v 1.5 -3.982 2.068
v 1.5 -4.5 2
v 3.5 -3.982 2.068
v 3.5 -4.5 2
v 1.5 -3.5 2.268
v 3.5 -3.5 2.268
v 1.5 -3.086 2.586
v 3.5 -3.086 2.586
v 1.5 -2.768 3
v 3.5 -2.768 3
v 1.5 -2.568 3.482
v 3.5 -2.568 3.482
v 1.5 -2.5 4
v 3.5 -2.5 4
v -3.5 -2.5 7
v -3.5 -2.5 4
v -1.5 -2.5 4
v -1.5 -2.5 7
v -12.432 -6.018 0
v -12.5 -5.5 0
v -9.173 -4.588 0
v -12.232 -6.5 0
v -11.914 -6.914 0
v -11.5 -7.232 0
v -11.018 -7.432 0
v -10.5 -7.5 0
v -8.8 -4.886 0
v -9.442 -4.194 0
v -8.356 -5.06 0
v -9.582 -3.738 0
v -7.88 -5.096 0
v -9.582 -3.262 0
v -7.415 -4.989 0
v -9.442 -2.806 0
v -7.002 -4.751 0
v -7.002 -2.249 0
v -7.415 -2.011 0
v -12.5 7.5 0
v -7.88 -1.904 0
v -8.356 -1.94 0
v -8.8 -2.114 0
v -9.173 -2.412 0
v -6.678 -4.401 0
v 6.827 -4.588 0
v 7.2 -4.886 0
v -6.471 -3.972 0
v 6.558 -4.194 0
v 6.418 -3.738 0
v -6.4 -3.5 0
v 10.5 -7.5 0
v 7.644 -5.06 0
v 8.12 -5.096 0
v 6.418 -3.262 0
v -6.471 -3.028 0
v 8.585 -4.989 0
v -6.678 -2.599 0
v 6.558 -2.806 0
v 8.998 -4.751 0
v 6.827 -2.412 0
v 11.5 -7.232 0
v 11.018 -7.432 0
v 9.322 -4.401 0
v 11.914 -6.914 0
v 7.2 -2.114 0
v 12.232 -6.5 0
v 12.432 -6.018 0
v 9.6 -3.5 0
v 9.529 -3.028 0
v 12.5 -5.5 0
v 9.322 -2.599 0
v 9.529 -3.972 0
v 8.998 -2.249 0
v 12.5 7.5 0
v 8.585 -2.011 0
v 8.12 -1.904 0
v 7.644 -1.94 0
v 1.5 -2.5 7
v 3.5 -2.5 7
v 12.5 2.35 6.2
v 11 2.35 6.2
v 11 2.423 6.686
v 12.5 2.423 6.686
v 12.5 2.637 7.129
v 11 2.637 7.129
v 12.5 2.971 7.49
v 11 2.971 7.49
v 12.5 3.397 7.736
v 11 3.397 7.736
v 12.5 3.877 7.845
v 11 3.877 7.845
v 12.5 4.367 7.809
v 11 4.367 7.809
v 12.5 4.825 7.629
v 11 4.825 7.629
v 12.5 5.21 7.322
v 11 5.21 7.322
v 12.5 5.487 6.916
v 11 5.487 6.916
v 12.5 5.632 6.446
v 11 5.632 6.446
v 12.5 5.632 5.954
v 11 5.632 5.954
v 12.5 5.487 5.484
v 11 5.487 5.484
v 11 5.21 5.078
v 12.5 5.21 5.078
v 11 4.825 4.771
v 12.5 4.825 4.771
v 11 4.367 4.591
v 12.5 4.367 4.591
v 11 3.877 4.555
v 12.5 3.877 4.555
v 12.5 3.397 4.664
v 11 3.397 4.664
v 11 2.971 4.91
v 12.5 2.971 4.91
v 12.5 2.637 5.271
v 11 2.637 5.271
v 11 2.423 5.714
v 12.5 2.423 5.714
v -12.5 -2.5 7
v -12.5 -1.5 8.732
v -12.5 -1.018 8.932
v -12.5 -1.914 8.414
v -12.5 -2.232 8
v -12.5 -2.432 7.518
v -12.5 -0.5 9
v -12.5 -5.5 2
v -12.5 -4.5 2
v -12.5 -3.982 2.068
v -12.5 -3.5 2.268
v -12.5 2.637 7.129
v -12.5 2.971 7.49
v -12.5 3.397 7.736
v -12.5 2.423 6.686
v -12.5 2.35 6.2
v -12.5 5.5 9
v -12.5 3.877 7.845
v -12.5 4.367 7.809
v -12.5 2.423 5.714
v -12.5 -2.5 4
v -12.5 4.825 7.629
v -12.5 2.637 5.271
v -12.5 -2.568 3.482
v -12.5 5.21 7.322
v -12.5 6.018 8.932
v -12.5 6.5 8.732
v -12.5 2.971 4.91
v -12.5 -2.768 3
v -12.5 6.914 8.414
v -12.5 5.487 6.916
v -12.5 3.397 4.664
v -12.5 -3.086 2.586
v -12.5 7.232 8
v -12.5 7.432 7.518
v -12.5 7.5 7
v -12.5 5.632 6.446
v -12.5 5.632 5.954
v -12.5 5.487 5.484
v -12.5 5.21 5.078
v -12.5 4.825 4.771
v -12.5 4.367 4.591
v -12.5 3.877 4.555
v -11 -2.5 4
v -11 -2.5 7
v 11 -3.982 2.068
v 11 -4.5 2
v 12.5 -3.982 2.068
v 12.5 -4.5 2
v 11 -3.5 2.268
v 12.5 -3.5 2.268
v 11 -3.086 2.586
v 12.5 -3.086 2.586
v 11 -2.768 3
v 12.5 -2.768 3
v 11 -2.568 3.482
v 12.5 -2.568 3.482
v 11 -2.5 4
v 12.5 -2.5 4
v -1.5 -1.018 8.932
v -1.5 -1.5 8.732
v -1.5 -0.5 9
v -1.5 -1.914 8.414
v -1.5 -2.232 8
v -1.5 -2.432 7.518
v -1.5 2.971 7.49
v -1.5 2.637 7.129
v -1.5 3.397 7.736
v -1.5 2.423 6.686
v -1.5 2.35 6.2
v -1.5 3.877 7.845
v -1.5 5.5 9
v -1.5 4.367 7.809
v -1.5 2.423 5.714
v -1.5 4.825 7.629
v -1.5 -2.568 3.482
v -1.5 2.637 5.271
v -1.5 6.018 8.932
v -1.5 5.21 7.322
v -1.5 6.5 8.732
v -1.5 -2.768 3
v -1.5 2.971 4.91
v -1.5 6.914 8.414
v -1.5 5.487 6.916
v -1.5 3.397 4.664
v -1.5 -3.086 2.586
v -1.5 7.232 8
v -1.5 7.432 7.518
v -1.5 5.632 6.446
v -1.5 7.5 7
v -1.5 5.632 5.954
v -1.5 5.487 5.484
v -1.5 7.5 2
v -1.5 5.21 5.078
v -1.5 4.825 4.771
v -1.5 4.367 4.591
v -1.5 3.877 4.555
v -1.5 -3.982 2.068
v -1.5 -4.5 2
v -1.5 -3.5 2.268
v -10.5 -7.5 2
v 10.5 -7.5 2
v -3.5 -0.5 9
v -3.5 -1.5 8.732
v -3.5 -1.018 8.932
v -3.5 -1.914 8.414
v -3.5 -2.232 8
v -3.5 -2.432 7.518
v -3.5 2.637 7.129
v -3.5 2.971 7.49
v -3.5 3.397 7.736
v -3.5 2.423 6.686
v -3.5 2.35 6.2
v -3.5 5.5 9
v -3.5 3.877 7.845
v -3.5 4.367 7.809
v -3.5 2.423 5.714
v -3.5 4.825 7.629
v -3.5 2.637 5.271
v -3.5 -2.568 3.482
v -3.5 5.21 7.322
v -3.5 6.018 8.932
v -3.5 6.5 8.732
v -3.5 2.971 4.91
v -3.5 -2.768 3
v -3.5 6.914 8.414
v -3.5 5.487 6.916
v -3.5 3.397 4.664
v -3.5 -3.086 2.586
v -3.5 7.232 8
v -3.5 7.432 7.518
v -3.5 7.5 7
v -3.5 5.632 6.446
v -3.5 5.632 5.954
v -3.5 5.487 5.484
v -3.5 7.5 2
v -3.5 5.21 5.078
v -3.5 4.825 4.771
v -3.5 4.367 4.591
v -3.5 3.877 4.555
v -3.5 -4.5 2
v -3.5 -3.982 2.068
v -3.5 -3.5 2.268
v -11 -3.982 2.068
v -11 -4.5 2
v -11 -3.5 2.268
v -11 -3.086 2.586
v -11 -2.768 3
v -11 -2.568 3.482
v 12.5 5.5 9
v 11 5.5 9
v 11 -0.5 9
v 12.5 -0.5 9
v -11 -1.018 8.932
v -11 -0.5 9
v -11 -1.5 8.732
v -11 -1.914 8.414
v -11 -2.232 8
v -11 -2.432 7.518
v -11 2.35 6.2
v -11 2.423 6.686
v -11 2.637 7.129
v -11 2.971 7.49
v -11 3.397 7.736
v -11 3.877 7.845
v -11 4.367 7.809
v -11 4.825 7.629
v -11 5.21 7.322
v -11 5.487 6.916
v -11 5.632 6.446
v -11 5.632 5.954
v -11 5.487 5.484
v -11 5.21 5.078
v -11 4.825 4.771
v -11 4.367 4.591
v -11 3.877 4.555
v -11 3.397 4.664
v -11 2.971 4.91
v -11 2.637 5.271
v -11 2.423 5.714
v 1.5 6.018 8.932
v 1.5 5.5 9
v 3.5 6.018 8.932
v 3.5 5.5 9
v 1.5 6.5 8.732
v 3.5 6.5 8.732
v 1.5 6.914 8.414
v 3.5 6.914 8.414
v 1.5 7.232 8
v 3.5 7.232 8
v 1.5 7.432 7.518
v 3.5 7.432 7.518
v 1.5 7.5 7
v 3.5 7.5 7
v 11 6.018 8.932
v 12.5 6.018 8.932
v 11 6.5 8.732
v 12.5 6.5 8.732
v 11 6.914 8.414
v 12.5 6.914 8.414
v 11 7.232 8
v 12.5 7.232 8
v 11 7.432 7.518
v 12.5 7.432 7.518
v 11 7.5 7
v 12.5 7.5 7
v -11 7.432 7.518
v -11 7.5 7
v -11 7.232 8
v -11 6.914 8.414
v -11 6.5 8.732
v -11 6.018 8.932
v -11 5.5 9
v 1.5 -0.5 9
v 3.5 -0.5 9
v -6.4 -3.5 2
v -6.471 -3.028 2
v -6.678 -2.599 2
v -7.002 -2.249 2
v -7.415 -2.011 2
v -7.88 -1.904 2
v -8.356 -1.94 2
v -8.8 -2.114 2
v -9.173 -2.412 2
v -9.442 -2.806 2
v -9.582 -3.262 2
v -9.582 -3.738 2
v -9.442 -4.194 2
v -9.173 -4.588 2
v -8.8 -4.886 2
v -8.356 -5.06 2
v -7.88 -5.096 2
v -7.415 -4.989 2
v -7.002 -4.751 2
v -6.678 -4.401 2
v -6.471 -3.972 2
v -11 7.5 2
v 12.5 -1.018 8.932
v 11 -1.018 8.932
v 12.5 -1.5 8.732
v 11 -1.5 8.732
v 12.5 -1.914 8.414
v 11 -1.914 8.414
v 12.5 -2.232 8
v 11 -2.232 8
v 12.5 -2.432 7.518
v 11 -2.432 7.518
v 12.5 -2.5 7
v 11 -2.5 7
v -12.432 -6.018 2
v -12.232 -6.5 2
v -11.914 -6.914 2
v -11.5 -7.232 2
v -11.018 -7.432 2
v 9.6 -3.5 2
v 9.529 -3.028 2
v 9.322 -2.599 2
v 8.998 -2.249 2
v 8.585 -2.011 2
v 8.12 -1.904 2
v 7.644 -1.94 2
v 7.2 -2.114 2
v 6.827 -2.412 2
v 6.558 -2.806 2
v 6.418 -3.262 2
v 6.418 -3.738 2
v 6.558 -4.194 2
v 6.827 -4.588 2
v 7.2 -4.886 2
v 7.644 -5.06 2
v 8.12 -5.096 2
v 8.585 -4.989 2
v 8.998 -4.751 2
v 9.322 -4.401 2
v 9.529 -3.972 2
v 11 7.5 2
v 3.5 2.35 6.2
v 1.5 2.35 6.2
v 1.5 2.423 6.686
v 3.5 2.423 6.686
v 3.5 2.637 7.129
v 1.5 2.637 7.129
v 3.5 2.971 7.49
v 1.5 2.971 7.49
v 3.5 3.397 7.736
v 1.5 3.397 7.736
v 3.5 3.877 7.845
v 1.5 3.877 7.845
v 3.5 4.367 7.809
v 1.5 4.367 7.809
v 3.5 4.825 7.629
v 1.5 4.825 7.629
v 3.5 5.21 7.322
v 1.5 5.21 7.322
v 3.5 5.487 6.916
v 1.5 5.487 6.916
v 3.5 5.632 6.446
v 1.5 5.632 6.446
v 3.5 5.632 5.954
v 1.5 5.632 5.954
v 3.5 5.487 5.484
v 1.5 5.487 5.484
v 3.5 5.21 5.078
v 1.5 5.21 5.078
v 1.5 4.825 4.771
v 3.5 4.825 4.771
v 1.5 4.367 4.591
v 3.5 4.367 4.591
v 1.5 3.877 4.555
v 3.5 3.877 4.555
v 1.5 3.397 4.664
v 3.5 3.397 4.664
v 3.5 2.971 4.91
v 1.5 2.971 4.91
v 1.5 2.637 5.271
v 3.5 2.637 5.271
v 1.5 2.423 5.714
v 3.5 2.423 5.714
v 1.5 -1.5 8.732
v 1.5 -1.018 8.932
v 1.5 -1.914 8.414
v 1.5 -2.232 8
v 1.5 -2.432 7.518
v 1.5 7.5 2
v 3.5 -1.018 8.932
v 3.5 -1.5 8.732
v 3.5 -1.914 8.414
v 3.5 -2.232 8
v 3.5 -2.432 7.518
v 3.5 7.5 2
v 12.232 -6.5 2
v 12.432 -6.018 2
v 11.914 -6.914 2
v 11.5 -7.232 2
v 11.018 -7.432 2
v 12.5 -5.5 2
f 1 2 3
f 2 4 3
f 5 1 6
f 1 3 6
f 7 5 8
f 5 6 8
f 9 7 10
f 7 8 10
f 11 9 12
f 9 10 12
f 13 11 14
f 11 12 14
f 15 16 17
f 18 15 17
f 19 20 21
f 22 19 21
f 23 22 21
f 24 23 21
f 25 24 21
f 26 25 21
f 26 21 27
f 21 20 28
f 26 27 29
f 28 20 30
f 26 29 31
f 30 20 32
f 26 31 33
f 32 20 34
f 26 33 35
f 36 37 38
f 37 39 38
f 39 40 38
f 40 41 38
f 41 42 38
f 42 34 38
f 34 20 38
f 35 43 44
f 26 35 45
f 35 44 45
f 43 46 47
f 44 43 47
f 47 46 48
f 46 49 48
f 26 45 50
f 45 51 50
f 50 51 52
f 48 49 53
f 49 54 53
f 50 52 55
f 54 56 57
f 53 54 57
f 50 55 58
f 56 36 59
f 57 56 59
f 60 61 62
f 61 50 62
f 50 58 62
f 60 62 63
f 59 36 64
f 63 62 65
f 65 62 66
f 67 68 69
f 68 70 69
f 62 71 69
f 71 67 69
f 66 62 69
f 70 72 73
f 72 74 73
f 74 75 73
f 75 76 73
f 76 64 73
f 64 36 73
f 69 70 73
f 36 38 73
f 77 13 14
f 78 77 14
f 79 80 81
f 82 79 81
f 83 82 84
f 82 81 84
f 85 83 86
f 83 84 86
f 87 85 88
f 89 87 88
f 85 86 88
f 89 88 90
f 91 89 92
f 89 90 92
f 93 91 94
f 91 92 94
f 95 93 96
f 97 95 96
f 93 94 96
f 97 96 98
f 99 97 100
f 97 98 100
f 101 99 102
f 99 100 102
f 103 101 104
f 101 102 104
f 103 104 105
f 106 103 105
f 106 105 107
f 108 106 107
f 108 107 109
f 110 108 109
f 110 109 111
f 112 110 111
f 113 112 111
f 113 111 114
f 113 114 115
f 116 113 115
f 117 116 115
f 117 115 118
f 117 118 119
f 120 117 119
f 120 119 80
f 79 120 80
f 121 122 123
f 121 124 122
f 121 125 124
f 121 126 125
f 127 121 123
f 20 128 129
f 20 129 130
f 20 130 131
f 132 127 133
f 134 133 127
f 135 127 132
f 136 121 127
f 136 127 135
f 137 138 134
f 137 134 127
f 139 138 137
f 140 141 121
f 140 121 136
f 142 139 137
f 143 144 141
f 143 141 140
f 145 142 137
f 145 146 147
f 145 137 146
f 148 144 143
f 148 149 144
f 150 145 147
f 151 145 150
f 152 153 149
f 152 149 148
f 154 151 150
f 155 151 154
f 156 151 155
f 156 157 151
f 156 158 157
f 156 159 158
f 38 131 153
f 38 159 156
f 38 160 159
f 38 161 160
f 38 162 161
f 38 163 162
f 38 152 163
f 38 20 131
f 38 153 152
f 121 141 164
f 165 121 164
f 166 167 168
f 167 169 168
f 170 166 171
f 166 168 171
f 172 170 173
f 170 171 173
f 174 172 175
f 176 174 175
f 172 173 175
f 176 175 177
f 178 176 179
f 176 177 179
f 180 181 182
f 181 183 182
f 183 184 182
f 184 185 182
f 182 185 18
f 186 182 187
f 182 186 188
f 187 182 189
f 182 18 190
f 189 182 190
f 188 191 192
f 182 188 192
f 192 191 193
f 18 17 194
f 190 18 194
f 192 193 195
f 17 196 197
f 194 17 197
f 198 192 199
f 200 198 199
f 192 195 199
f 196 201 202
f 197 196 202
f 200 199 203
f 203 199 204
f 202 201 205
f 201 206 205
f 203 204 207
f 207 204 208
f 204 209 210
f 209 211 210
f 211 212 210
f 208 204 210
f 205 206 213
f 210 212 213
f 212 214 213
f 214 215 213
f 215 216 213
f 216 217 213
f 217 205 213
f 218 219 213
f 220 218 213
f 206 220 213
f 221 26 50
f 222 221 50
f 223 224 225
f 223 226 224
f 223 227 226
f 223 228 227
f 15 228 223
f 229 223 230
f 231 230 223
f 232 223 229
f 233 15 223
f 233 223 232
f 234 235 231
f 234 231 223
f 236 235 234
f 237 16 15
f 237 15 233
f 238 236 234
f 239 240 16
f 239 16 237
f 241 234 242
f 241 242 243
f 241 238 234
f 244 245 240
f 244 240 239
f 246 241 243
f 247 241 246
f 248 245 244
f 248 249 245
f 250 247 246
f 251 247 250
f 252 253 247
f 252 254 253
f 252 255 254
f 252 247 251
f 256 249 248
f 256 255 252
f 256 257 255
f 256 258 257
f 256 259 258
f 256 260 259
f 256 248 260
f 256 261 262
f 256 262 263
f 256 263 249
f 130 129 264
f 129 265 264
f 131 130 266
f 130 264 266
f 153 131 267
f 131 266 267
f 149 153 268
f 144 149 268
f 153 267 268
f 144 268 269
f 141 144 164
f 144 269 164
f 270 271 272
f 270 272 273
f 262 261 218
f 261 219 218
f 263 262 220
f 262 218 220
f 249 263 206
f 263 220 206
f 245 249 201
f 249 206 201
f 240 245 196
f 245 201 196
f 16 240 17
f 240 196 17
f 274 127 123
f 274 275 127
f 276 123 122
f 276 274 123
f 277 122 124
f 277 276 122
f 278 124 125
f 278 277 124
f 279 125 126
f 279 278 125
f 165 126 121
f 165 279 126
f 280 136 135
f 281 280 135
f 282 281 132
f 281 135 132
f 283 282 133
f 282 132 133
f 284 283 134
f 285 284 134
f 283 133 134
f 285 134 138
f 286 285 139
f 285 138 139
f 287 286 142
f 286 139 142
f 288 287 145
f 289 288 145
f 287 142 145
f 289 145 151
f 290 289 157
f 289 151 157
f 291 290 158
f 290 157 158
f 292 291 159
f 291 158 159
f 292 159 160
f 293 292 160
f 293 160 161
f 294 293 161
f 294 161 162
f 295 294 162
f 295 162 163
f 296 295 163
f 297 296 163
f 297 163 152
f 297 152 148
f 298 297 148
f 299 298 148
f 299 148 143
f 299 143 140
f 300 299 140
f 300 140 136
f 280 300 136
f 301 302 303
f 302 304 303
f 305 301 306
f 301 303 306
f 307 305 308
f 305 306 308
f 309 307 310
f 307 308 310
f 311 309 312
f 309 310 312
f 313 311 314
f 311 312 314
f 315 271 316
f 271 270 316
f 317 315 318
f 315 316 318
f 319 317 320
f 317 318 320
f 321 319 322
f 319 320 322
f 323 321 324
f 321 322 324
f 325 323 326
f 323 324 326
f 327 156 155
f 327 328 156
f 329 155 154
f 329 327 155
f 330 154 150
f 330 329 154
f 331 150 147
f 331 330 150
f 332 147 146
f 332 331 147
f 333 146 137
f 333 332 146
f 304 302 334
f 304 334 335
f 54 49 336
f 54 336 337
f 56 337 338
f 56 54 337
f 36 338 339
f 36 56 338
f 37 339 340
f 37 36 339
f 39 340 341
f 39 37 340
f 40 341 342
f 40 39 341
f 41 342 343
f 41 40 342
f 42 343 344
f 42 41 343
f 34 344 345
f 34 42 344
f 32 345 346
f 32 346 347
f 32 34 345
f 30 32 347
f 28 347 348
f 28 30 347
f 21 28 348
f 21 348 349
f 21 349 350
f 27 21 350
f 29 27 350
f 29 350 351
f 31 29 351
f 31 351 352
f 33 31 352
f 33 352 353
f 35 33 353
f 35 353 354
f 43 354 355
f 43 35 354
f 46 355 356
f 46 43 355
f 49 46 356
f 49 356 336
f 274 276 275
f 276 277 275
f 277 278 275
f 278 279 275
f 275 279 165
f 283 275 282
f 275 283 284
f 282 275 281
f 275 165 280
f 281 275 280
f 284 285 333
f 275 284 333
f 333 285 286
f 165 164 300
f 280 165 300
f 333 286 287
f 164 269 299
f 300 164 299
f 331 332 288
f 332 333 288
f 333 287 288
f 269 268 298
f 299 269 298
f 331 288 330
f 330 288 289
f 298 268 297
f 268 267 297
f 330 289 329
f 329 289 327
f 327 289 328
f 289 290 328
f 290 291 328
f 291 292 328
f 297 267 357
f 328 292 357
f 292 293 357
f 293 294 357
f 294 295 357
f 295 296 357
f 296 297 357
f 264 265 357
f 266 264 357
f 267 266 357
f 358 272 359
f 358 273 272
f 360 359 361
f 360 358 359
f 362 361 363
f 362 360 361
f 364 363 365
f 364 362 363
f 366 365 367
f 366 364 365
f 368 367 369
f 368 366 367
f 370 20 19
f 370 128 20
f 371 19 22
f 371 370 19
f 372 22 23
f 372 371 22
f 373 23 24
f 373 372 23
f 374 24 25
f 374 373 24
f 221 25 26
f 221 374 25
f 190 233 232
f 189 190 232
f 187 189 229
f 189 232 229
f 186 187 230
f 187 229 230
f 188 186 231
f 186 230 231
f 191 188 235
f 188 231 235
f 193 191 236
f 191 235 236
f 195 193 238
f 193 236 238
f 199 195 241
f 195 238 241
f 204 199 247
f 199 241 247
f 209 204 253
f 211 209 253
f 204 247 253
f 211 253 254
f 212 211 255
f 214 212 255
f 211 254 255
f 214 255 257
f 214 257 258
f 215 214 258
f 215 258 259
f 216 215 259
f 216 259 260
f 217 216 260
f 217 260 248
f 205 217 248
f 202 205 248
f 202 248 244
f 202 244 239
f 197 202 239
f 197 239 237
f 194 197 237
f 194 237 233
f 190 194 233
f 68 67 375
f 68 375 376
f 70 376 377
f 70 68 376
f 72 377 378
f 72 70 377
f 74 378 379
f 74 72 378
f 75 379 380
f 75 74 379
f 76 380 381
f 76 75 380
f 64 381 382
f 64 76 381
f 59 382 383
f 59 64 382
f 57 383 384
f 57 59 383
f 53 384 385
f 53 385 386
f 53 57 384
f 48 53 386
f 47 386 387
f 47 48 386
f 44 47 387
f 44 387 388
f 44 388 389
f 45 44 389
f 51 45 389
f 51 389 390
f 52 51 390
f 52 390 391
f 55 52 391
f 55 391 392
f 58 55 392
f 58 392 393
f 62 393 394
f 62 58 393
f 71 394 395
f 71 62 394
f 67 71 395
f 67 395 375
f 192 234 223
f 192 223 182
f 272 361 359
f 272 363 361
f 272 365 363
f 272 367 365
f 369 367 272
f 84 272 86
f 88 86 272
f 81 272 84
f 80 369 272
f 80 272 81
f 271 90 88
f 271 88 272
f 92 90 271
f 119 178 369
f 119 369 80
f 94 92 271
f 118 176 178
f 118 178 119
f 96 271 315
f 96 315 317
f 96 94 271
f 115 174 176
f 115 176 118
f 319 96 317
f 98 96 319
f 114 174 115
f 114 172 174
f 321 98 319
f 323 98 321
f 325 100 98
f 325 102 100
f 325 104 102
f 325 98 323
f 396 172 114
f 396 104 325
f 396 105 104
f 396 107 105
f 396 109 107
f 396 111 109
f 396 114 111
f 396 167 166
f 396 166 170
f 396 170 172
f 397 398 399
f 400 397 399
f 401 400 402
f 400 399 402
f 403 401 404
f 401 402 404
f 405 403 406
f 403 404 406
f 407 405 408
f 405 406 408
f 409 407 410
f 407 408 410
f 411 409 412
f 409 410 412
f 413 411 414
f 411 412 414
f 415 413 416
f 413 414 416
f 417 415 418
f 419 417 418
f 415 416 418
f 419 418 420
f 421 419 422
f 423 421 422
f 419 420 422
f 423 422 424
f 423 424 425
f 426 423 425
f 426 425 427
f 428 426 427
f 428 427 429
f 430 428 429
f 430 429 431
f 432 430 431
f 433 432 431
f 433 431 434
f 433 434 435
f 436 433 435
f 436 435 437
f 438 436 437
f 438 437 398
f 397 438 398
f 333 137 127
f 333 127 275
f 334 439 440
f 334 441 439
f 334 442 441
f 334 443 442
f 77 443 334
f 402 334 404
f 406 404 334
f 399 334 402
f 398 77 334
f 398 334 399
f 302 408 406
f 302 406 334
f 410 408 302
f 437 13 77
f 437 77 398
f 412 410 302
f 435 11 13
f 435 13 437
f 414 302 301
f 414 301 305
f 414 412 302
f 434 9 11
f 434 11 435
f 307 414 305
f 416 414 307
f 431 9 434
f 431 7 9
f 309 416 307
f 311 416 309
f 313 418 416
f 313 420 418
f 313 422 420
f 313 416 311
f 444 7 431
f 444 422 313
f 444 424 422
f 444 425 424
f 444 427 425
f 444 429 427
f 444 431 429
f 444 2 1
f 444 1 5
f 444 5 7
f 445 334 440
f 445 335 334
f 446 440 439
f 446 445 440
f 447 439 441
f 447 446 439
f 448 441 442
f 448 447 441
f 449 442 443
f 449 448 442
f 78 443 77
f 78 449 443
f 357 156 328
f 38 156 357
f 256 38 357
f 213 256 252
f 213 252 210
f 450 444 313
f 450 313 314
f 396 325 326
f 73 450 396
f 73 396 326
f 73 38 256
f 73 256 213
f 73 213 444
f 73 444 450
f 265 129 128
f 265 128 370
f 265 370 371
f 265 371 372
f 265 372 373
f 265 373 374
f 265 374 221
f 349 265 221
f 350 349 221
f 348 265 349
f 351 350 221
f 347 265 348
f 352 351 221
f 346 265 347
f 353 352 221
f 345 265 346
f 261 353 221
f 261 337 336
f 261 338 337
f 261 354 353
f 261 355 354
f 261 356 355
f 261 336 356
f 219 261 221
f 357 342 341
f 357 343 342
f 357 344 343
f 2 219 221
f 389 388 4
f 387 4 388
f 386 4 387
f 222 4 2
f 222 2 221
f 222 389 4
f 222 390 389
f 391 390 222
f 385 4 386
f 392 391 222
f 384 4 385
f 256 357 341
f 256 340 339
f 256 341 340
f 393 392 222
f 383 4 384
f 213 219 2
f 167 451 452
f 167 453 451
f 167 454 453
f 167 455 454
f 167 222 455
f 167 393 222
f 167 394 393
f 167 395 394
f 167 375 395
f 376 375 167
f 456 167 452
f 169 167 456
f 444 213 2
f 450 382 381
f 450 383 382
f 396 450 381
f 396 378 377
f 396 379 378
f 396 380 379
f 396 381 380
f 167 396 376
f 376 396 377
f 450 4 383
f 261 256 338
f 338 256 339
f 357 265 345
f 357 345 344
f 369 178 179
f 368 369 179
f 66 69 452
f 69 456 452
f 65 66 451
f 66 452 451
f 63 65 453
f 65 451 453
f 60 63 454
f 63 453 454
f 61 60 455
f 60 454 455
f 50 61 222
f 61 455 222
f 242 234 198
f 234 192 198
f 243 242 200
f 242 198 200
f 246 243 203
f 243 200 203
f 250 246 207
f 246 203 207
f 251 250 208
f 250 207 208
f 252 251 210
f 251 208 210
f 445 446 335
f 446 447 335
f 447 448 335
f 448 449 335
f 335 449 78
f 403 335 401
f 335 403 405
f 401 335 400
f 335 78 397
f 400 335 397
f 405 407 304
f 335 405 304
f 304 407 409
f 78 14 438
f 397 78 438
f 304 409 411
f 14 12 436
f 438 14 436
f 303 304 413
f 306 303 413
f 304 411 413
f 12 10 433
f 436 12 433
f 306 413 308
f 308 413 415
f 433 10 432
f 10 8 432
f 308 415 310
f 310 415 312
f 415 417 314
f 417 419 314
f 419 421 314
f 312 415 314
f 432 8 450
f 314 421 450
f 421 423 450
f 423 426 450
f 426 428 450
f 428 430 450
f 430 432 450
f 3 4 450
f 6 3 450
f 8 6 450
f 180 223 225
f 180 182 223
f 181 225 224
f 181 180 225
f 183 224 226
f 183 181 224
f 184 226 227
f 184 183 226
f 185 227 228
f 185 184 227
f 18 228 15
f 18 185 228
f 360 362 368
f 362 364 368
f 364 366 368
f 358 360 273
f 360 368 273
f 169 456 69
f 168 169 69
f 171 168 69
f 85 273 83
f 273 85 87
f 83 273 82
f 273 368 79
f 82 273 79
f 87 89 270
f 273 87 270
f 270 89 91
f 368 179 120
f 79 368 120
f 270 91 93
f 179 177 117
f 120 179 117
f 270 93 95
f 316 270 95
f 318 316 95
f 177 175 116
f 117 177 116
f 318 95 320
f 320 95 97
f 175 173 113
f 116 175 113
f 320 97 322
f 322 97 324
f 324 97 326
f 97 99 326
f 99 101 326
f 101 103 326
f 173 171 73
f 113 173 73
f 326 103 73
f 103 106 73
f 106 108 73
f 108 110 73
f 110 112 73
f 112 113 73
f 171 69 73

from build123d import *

# Parameters (mm, degrees)
SKETCH_2_W          = 25
SKETCH_2_H          = 15
SKETCH_2_R          = 1.6
EXTRUDE_1_DEPTH     = 2
SKETCH_3_W          = 1.5
SKETCH_3_H          = 10
SKETCH_3_W_2        = 2
EXTRUDE_2_DEPTH     = 7
FILLET_1_R          = 2
SKETCH_4_R          = 1.65
CUT_EXTRUDE_1_DEPTH = 28.608875385


with BuildPart() as part:
    # 草图2 → 凸台-拉伸1 (new body)
    with BuildSketch(Plane.XY):
        Rectangle(SKETCH_2_W, SKETCH_2_H)
        with Locations((-8, -3.5)):
            Circle(SKETCH_2_R, mode=Mode.SUBTRACT)
        with Locations((8, -3.5)):
            Circle(SKETCH_2_R, mode=Mode.SUBTRACT)
    extrude(amount=EXTRUDE_1_DEPTH)

    # 草图3 → 凸台-拉伸2 (add)
    with BuildSketch(Plane.XY.offset(2)):
        with Locations((-11.75, 2.5)):
            Rectangle(SKETCH_3_W, SKETCH_3_H)
        with Locations((-2.5, 2.5)):
            Rectangle(SKETCH_3_W_2, SKETCH_3_H)
        with Locations((2.5, 2.5)):
            Rectangle(SKETCH_3_W_2, SKETCH_3_H)
        with Locations((11.75, 2.5)):
            Rectangle(SKETCH_3_W, SKETCH_3_H)
    extrude(amount=EXTRUDE_2_DEPTH)

    # 圆角1
    fillet_1_edges = [part.edges().sort_by_distance(p)[0] for p in [
        (-11.75, -2.5, 2),
        (-11.75, -2.5, 9),
        (-11.75, 7.5, 9),
        (-2.5, -2.5, 2),
        (-2.5, -2.5, 9),
        (-2.5, 7.5, 9),
        (2.5, -2.5, 2),
        (2.5, -2.5, 9),
        (2.5, 7.5, 9),
        (11.75, -2.5, 2),
        (11.75, 7.5, 9),
        (11.75, -2.5, 9),
        (12.5, -7.5, 1),
        (-12.5, -7.5, 1),
    ]]
    fillet(fillet_1_edges, radius=FILLET_1_R)

    # 草图4 → 切除-拉伸1 (cut, through all)
    with BuildSketch(Plane.ZY.offset(12.5)):
        with Locations(Location((6.2, 4, 0), (0, 0, 270))):
            Circle(SKETCH_4_R)
    extrude(amount=-CUT_EXTRUDE_1_DEPTH, mode=Mode.SUBTRACT)


solid = part.part
